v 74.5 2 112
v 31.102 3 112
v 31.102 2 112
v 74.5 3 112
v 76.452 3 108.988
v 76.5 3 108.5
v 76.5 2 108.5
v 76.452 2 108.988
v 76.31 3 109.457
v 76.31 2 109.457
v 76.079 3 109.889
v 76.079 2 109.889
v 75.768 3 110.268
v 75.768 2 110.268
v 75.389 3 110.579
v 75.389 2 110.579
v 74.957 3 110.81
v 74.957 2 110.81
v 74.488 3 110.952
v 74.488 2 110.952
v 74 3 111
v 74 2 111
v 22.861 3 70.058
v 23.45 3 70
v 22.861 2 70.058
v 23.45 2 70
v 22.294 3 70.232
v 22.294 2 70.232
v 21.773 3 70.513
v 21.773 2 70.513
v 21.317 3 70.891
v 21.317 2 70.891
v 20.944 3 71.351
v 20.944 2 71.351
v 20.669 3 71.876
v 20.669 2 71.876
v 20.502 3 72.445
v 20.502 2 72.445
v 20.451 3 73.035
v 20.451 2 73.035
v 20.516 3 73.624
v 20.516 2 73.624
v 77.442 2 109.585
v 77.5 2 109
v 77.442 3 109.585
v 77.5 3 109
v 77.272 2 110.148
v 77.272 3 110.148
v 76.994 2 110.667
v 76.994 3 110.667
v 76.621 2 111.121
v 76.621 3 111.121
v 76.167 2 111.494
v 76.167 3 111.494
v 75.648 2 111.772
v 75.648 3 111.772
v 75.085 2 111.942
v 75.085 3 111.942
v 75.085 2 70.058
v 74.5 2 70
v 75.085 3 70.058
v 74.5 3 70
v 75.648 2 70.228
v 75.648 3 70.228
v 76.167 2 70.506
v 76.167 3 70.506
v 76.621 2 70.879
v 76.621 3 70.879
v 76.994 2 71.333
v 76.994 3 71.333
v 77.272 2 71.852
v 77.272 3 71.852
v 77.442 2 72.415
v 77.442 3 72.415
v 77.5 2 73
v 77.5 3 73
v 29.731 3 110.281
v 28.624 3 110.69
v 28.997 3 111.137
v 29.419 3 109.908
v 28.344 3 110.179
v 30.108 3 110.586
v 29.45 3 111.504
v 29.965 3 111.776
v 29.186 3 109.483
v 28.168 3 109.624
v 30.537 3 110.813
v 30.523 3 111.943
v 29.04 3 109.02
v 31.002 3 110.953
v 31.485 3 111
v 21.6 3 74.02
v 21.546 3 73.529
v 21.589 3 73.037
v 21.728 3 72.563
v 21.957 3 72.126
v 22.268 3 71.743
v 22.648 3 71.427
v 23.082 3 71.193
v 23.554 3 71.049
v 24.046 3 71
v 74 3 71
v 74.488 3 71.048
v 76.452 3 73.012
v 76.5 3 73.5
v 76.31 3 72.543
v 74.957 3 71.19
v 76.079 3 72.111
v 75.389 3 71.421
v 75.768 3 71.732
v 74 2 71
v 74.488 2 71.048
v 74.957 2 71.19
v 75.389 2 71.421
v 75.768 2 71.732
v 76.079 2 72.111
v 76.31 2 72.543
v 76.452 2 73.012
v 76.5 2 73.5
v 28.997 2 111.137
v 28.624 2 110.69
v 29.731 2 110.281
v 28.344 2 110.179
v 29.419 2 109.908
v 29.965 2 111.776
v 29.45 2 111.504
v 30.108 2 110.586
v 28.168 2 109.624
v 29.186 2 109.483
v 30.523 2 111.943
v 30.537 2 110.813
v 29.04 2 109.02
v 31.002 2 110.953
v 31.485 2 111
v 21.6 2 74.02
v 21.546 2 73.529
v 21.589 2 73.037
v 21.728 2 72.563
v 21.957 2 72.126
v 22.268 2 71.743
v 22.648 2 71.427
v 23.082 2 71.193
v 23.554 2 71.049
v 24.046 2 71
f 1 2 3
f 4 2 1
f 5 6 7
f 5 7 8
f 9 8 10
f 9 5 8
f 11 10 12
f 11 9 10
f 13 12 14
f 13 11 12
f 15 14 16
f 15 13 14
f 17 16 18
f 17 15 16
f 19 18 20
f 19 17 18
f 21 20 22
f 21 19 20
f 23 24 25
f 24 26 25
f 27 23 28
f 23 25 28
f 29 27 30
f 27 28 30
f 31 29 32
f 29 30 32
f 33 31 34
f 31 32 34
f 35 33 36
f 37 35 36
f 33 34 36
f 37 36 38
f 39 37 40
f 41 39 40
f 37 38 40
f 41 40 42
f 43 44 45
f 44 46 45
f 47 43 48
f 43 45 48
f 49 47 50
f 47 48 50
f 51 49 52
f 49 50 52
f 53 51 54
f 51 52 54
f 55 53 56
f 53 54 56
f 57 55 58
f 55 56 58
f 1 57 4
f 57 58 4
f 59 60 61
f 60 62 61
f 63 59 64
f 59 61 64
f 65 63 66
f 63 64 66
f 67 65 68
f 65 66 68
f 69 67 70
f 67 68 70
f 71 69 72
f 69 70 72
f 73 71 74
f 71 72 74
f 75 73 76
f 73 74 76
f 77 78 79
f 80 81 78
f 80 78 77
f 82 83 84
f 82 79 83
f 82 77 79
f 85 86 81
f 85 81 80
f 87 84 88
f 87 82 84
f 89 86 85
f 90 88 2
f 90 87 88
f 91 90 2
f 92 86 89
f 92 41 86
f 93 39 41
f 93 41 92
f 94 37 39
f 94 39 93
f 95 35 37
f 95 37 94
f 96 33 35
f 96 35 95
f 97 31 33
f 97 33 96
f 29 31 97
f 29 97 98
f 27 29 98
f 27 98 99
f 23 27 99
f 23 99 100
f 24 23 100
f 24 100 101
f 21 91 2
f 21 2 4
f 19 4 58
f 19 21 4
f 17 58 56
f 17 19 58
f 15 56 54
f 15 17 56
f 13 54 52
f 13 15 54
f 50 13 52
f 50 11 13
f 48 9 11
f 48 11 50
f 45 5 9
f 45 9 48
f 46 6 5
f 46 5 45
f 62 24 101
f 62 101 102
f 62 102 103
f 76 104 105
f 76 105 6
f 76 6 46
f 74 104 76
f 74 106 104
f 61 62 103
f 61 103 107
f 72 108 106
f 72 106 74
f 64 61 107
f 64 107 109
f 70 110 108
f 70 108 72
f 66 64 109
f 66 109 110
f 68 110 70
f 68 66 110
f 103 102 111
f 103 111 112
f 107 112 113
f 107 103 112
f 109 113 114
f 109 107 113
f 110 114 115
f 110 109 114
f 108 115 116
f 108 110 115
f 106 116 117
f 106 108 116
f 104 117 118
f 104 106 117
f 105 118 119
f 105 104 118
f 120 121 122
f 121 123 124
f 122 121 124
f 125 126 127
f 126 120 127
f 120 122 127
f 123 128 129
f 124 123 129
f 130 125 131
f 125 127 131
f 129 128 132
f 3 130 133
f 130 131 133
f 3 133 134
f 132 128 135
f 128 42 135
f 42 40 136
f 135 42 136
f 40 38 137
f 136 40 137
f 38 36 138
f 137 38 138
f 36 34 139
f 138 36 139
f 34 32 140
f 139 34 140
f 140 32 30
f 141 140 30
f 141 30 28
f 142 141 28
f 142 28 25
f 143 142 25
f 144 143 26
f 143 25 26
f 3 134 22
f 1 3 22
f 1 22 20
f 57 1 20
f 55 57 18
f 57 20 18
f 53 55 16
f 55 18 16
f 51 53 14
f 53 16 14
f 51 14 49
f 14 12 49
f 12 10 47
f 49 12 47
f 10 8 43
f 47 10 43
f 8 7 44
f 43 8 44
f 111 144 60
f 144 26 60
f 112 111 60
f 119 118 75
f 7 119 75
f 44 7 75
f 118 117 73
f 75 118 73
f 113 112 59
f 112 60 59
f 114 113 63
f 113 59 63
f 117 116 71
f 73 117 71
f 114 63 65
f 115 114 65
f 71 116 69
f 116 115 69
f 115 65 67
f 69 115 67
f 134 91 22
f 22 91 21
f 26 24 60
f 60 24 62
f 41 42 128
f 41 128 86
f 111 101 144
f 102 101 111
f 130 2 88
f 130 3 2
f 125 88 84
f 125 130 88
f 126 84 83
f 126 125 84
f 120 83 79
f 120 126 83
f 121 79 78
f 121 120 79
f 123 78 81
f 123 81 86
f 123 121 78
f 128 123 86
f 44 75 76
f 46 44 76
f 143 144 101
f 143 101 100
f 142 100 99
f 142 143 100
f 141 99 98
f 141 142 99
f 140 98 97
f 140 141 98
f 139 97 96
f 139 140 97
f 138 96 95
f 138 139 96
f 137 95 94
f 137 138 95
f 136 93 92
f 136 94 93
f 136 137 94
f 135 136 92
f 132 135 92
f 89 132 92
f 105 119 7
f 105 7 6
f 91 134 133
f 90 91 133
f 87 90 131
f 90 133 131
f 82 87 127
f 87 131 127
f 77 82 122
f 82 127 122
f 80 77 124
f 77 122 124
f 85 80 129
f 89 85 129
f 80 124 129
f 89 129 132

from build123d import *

# Parameters (mm, degrees)
BOX052_W               = 11
BOX052_H               = 11
BOX052_DEPTH           = 48
BOX052_ROLL_ANGLE      = -2.200006
BOX052_PITCH_ANGLE     = 12.000025
BOX052_PLACEMENT_ANGLE = -1e-06
BOX053_W               = 57
BOX053_H               = 5
BOX053_DEPTH           = 40
FILLET060_R            = 2.5
BOX006_W               = 11
BOX006_H               = 11
BOX006_DEPTH           = 48
BOX006_ROLL_ANGLE      = -2.200006
BOX006_PITCH_ANGLE     = 12.000025
BOX006_PLACEMENT_ANGLE = -1e-06
BOX005_W               = 58
BOX005_H               = 1
BOX005_DEPTH           = 42
FILLET058_R            = 3


with BuildPart() as cube478:
    # Box052 → Box052 (new body)
    with BuildSketch(Plane.XY):
        with Locations((5.5, 5.5)):
            Rectangle(BOX052_W, BOX052_H)
    extrude(amount=BOX052_DEPTH)


with BuildPart() as cube478_1:
    # Box052 roll: moved
    add(cube478.part.rotate(Axis((0, 0, 0), (1, 0, 0)), BOX052_ROLL_ANGLE))


with BuildPart() as cube478_2:
    # Box052 pitch: moved
    add(cube478_1.part.rotate(Axis((0, 0, 0), (0, 1, 0)), BOX052_PITCH_ANGLE))


with BuildPart() as cube478_3:
    # Box052 placement: moved
    add(cube478_2.part.moved(Location((9.5, -2, 70))).rotate(Axis((9.5, -2, 70), (0, 0, 1)), BOX052_PLACEMENT_ANGLE))


with BuildPart() as fillet060:
    # Box053 → Box053 (new body)
    with BuildSketch(Plane(origin=(19.5, 2, 71), x_dir=(1, 0, 0), z_dir=(0, 0, 1))):
        with Locations((28.5, 2.5)):
            Rectangle(BOX053_W, BOX053_H)
    extrude(amount=BOX053_DEPTH)

    # Cut038: cut Cube478
    add(cube478_3.part, mode=Mode.SUBTRACT)

    # Fillet060
    fillet060_edges = [fillet060.edges().sort_by_distance(p)[0] for p in [
        (76.5, 4.5, 71),
        (20.958305, 4.5, 71),
        (76.5, 4.5, 111),
        (29.460585, 4.5, 111),
    ]]
    fillet(fillet060_edges, radius=FILLET060_R)


with BuildPart() as cube364:
    # Box006 → Box006 (new body)
    with BuildSketch(Plane.XY):
        with Locations((5.5, 5.5)):
            Rectangle(BOX006_W, BOX006_H)
    extrude(amount=BOX006_DEPTH)


with BuildPart() as cube364_1:
    # Box006 roll: moved
    add(cube364.part.rotate(Axis((0, 0, 0), (1, 0, 0)), BOX006_ROLL_ANGLE))


with BuildPart() as cube364_2:
    # Box006 pitch: moved
    add(cube364_1.part.rotate(Axis((0, 0, 0), (0, 1, 0)), BOX006_PITCH_ANGLE))


with BuildPart() as cube364_3:
    # Box006 placement: moved
    add(cube364_2.part.moved(Location((8.5, -2, 70))).rotate(Axis((8.5, -2, 70), (0, 0, 1)), BOX006_PLACEMENT_ANGLE))


with BuildPart() as cut039:
    # Box005 → Box005 (new body)
    with BuildSketch(Plane(origin=(19.5, 2, 70), x_dir=(1, 0, 0), z_dir=(0, 0, 1))):
        with Locations((29, 0.5)):
            Rectangle(BOX005_W, BOX005_H)
    extrude(amount=BOX005_DEPTH)

    # Cut002: cut Cube364
    add(cube364_3.part, mode=Mode.SUBTRACT)

    # Fillet058
    fillet058_edges = [cut039.edges().sort_by_distance(p)[0] for p in [
        (77.5, 2.5, 70),
        (19.745748, 2.5, 70),
        (77.5, 2.5, 112),
        (28.673142, 2.5, 112),
    ]]
    fillet(fillet058_edges, radius=FILLET058_R)

    # Cut039: cut Fillet060
    add(fillet060.part, mode=Mode.SUBTRACT)


solid = cut039.part
